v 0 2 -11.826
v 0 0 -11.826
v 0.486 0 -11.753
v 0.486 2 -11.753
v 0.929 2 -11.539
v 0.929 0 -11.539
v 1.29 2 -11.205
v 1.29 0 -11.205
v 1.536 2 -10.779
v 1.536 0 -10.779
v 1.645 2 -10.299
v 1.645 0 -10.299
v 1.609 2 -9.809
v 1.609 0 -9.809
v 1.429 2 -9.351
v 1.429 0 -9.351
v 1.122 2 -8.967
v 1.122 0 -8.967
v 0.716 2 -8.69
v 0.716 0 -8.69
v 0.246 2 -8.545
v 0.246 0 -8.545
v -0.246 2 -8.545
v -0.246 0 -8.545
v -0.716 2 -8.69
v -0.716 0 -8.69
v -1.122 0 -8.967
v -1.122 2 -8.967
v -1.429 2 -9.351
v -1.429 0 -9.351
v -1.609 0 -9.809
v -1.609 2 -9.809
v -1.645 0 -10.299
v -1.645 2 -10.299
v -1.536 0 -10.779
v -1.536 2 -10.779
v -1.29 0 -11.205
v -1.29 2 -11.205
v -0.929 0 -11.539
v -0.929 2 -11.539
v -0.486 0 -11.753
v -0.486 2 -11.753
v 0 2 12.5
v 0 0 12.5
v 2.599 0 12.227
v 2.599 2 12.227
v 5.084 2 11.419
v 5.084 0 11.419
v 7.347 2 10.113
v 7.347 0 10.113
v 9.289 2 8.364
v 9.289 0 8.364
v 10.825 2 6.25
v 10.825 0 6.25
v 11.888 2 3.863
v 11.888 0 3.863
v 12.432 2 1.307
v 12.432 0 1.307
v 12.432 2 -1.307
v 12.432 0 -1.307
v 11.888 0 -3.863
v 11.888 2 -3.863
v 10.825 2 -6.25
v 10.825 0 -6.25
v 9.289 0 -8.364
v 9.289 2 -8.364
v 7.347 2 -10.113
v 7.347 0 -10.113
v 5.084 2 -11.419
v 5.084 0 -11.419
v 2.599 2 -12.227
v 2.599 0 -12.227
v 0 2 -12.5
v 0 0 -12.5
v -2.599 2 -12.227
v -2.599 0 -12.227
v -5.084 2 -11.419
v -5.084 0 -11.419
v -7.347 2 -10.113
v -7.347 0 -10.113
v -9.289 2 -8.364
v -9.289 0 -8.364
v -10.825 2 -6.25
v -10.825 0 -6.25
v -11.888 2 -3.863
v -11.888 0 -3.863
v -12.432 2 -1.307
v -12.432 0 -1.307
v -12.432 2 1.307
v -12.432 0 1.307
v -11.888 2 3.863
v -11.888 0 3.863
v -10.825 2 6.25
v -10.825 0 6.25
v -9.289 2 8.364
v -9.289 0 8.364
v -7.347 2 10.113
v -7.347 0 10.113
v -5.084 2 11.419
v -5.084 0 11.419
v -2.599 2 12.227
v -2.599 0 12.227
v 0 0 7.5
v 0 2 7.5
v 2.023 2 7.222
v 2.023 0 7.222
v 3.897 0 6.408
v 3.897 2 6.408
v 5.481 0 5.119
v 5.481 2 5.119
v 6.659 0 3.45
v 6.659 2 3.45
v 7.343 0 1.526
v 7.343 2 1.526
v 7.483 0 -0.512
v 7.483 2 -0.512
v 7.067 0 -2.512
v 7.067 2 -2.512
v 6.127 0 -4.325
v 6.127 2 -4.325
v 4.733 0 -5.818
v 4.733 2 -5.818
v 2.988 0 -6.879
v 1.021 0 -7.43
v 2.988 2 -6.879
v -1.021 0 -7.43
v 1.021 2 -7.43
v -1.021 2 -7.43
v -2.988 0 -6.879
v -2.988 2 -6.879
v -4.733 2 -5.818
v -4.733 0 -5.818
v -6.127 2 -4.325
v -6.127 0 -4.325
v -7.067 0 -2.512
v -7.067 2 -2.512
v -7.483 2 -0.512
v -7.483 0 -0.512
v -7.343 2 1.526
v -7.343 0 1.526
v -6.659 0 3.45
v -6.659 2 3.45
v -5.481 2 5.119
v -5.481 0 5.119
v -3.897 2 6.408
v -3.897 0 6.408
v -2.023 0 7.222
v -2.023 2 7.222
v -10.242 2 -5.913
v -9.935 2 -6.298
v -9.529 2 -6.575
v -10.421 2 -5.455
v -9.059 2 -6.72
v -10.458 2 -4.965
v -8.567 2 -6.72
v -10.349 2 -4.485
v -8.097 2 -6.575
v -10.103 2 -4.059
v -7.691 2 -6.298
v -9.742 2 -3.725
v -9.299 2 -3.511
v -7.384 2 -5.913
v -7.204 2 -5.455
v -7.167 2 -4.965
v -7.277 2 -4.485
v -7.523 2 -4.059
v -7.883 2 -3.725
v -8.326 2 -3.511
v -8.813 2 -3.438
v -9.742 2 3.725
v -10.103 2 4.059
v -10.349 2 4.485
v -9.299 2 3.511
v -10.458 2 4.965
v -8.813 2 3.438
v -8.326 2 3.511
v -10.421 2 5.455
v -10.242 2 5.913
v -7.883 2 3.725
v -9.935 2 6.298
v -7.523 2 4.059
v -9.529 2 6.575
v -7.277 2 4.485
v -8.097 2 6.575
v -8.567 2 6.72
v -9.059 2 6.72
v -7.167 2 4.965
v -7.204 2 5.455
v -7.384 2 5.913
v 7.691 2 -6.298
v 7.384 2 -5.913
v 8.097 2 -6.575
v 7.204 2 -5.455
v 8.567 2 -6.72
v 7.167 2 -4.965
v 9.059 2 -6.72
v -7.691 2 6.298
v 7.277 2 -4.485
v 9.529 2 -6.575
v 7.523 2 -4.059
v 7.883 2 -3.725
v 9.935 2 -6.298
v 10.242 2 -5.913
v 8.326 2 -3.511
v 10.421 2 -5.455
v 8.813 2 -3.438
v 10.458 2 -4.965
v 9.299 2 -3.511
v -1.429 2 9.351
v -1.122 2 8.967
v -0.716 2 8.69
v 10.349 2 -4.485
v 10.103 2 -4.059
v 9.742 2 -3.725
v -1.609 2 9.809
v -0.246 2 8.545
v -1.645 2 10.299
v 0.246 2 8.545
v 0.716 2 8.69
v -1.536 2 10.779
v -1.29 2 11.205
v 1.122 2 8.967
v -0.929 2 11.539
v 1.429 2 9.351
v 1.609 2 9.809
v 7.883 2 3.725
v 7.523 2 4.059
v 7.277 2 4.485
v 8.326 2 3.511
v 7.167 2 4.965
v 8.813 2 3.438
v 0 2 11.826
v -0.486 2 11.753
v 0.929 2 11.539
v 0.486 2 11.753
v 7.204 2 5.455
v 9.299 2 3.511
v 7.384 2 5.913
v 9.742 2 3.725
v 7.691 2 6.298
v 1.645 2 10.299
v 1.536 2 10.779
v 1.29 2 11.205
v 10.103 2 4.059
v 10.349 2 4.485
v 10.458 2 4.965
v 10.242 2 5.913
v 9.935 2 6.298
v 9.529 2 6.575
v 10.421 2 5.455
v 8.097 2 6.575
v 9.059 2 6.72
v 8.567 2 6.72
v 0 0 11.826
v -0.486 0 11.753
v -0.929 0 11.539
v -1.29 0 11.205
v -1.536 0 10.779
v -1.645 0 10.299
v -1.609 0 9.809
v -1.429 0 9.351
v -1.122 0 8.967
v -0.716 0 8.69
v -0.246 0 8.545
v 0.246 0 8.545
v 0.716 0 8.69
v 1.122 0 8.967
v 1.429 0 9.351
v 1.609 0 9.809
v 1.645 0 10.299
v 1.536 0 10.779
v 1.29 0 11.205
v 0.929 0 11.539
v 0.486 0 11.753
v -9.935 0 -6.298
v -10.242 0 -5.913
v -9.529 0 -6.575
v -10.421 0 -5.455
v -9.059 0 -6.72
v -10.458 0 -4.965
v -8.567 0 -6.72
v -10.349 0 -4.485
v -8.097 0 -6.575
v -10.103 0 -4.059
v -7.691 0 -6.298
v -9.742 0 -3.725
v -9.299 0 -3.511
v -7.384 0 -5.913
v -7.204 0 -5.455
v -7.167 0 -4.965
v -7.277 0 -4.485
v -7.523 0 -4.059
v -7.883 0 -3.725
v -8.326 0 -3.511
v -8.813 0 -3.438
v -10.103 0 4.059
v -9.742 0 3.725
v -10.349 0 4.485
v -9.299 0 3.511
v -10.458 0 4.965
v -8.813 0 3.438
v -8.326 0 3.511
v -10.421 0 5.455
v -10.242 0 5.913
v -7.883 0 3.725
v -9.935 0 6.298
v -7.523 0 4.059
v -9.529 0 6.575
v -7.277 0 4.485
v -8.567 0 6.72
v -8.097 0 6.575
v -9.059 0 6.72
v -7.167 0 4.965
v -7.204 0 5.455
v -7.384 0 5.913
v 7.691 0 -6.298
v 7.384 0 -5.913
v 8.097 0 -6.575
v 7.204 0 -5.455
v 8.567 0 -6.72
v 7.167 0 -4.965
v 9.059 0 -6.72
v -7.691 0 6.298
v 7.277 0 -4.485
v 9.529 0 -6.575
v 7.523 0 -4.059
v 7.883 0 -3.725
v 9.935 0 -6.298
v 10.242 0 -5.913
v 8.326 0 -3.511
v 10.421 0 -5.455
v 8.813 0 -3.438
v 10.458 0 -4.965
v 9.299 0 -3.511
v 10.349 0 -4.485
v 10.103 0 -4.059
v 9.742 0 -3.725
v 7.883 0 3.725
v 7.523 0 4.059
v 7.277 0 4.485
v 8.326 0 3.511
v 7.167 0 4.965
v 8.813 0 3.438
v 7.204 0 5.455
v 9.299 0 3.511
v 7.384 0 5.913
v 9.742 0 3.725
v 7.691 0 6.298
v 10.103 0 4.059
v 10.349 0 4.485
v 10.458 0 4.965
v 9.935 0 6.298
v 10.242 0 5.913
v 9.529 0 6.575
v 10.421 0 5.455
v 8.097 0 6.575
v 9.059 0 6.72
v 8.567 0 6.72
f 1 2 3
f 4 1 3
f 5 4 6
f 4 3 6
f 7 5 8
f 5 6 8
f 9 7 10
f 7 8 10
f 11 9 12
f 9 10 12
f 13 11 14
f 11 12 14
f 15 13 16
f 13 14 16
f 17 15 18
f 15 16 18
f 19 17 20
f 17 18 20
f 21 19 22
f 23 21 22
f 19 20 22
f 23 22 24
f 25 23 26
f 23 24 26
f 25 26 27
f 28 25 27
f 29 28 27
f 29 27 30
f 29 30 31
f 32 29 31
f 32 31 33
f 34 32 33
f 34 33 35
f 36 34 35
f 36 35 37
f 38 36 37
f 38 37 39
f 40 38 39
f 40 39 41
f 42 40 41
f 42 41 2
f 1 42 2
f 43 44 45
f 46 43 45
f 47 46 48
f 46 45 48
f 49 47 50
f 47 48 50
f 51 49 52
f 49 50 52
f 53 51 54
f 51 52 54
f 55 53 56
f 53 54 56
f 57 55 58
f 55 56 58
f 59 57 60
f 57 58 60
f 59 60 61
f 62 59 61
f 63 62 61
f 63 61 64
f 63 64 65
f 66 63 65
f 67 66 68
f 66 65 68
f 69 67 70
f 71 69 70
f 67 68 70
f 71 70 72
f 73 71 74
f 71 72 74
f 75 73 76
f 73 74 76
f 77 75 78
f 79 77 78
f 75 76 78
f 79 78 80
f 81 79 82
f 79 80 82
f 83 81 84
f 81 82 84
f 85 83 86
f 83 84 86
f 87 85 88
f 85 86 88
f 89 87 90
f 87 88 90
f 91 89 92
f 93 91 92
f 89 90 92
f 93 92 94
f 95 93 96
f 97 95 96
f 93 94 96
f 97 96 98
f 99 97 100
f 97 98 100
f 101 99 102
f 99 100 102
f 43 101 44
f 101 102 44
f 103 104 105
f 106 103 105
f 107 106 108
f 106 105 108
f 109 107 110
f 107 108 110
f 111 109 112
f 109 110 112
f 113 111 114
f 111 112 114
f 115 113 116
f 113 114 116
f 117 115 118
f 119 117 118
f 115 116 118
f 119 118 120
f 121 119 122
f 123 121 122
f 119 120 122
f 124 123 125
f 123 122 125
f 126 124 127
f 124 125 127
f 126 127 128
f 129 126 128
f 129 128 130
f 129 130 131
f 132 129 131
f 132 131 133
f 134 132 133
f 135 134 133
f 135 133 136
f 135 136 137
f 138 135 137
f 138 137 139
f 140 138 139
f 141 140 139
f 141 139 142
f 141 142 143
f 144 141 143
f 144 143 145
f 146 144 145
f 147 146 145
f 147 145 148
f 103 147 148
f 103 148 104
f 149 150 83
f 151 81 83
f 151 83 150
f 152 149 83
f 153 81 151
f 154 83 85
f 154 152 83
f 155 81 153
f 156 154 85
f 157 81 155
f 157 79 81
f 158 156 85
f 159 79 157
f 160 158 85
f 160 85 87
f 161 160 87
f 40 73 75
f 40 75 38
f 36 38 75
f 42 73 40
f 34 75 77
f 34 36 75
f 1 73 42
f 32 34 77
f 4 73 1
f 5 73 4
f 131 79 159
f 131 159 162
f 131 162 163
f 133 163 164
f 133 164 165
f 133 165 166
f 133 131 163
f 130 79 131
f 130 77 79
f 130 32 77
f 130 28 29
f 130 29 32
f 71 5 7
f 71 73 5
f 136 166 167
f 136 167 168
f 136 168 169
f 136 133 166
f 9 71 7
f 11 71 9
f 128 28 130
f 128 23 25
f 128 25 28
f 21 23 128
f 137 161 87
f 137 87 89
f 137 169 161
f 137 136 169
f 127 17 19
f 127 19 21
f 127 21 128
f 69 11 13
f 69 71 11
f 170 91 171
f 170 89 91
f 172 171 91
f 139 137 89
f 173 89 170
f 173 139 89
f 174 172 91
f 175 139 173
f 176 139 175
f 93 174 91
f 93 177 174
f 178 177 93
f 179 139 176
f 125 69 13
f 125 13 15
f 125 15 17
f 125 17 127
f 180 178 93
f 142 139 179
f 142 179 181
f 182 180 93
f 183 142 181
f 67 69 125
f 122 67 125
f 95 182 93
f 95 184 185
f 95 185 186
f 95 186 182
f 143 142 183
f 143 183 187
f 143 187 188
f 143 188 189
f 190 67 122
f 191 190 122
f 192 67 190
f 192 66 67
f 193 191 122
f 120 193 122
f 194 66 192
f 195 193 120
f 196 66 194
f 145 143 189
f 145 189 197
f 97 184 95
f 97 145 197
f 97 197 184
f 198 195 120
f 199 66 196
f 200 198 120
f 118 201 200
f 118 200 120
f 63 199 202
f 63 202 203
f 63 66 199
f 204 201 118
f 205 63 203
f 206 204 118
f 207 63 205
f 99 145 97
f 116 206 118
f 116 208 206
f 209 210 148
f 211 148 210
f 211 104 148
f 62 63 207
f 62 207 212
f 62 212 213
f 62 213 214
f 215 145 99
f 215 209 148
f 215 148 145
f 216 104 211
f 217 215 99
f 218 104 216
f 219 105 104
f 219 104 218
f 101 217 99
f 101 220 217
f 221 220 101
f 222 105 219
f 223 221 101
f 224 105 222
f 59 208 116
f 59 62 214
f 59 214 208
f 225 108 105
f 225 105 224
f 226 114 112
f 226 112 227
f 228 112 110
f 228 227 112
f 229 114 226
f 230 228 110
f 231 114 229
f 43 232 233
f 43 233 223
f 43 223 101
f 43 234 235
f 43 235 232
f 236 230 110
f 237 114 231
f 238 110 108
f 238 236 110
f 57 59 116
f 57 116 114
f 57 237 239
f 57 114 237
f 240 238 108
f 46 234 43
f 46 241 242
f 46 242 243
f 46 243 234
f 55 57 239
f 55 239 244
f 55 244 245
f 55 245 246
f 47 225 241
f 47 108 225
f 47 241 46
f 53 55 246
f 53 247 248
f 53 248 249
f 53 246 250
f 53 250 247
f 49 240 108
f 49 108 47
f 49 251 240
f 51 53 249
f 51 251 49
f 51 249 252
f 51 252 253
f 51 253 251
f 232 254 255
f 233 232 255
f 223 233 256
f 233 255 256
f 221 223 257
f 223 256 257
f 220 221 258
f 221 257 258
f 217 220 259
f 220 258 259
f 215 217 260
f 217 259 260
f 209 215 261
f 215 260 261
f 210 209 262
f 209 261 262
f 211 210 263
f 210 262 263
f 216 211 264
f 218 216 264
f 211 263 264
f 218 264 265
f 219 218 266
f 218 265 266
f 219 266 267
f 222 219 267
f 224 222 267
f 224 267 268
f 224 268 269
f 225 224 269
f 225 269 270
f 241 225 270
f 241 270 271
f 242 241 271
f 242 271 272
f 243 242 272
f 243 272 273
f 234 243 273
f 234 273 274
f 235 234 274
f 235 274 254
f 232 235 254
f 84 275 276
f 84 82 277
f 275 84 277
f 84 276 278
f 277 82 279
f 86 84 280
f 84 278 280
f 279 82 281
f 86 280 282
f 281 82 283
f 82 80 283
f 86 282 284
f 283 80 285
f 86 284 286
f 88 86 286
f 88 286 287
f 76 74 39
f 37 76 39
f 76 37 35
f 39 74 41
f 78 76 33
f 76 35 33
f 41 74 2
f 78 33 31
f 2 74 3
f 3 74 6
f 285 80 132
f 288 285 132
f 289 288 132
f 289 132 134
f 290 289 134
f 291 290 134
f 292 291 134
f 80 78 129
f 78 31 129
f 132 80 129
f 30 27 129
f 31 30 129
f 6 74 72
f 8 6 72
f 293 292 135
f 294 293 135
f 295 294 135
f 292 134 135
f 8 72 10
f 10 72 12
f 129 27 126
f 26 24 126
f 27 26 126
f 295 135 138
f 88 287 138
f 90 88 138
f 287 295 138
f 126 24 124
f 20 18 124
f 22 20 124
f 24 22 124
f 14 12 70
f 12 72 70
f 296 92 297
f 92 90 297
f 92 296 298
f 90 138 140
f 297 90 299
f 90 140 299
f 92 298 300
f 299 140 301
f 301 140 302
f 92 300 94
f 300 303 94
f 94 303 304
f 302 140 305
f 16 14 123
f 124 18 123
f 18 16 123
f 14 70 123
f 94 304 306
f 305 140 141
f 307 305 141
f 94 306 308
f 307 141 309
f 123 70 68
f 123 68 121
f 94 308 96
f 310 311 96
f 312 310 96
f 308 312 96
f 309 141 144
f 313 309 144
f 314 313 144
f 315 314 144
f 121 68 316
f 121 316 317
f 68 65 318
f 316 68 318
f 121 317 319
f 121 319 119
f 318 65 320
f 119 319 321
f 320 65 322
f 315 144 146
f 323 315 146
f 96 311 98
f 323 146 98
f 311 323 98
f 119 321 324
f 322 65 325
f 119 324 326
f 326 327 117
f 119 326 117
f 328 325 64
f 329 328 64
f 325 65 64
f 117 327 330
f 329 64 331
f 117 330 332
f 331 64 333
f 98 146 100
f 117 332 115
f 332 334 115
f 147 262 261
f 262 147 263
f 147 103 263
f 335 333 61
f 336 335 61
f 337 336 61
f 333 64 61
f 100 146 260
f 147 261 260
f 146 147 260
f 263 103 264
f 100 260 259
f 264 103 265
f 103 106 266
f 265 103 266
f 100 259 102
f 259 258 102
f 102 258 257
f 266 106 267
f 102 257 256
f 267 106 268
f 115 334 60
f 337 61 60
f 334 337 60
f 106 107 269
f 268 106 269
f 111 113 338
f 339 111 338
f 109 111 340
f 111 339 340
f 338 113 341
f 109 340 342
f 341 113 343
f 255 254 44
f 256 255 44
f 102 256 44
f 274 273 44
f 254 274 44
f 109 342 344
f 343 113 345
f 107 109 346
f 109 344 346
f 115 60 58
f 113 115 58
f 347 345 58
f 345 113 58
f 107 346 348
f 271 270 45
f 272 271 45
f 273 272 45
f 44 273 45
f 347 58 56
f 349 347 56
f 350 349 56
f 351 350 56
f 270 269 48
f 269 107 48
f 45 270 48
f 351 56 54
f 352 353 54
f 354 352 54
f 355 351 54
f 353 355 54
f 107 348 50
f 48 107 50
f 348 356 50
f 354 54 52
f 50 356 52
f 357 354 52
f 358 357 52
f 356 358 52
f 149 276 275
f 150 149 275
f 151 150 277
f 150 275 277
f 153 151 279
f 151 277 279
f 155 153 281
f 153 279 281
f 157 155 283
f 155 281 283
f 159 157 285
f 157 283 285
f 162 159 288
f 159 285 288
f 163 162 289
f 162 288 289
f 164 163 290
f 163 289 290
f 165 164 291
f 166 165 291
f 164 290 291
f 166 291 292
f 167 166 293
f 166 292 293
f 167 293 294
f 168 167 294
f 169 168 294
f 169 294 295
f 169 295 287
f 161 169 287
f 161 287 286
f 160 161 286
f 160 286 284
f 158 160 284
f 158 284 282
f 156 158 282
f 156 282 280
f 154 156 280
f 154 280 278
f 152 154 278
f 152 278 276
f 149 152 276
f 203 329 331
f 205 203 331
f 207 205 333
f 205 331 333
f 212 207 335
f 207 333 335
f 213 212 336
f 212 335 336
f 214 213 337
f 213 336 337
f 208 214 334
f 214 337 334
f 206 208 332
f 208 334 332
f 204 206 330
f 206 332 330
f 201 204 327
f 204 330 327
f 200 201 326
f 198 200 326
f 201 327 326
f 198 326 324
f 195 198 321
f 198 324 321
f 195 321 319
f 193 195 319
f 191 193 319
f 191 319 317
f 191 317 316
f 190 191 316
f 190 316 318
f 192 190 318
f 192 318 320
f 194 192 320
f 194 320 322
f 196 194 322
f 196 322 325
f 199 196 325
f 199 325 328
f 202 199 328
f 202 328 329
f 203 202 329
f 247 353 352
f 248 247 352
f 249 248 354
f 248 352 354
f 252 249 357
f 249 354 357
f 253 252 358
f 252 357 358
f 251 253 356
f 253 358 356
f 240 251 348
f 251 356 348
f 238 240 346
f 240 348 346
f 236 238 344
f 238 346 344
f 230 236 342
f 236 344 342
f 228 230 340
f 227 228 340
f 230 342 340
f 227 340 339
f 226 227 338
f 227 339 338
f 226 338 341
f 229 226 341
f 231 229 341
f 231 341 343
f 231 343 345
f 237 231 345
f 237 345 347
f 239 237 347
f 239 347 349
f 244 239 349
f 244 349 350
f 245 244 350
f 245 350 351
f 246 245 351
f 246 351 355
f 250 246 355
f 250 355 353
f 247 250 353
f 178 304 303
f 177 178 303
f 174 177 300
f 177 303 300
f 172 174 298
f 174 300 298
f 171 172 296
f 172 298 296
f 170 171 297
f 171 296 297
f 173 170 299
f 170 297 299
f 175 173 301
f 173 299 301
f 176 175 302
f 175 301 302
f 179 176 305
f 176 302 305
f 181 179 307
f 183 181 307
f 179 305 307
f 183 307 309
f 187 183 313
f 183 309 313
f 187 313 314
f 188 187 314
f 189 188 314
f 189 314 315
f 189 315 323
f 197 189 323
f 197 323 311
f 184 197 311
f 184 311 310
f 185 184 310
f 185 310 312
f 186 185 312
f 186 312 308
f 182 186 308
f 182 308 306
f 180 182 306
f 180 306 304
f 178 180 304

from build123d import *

# Parameters (mm, degrees)
SKETCH_1_R               = 12.5
EXTRUDE_1_DEPTH          = 2
SKETCH_2_R               = 1.65
CUT_EXTRUDE_1_DEPTH      = 18.790446875
PATTERN_CIRCULAR_1_COUNT = 6
SKETCH_6_R               = 7.5
CUT_EXTRUDE_3_DEPTH      = 18.790446875


with BuildPart() as part:
    # Эскиз1 → Бобышка-Вытянуть1 (new body)
    with BuildSketch(Plane(origin=(0, 0, 0), x_dir=(1, 0, 0), z_dir=(0, 1, 0))):
        with Locations(Location((0, 0, 0), (0, 0, 270))):
            Circle(SKETCH_1_R)
    extrude(amount=EXTRUDE_1_DEPTH)

    # Эскиз2 → Вырез-Вытянуть1 (cut, through all)
    with BuildSketch(Plane.XZ):
        with Locations(Location((0, -10.176132167, 0), (0, 0, 270))):
            Circle(SKETCH_2_R)
    cut_extrude_1 = extrude(amount=-CUT_EXTRUDE_1_DEPTH, mode=Mode.SUBTRACT)

    # Круговой массив1: Вырез-Вытянуть1 ×6 about axis
    pattern_circular_1_axis = Axis((0, 0, 0), (0, 1, 0))
    for i in range(1, PATTERN_CIRCULAR_1_COUNT):
        add(cut_extrude_1.rotate(pattern_circular_1_axis, i * 360 / PATTERN_CIRCULAR_1_COUNT), mode=Mode.SUBTRACT)

    # Эскиз6 → Вырез-Вытянуть3 (cut, through all)
    with BuildSketch(Plane(origin=(0, 2, 0), x_dir=(1, 0, 0), z_dir=(0, 1, 0))):
        with Locations(Location((0, 0, 0), (0, 0, 270))):
            Circle(SKETCH_6_R)
    extrude(amount=-CUT_EXTRUDE_3_DEPTH, mode=Mode.SUBTRACT)


solid = part.part
